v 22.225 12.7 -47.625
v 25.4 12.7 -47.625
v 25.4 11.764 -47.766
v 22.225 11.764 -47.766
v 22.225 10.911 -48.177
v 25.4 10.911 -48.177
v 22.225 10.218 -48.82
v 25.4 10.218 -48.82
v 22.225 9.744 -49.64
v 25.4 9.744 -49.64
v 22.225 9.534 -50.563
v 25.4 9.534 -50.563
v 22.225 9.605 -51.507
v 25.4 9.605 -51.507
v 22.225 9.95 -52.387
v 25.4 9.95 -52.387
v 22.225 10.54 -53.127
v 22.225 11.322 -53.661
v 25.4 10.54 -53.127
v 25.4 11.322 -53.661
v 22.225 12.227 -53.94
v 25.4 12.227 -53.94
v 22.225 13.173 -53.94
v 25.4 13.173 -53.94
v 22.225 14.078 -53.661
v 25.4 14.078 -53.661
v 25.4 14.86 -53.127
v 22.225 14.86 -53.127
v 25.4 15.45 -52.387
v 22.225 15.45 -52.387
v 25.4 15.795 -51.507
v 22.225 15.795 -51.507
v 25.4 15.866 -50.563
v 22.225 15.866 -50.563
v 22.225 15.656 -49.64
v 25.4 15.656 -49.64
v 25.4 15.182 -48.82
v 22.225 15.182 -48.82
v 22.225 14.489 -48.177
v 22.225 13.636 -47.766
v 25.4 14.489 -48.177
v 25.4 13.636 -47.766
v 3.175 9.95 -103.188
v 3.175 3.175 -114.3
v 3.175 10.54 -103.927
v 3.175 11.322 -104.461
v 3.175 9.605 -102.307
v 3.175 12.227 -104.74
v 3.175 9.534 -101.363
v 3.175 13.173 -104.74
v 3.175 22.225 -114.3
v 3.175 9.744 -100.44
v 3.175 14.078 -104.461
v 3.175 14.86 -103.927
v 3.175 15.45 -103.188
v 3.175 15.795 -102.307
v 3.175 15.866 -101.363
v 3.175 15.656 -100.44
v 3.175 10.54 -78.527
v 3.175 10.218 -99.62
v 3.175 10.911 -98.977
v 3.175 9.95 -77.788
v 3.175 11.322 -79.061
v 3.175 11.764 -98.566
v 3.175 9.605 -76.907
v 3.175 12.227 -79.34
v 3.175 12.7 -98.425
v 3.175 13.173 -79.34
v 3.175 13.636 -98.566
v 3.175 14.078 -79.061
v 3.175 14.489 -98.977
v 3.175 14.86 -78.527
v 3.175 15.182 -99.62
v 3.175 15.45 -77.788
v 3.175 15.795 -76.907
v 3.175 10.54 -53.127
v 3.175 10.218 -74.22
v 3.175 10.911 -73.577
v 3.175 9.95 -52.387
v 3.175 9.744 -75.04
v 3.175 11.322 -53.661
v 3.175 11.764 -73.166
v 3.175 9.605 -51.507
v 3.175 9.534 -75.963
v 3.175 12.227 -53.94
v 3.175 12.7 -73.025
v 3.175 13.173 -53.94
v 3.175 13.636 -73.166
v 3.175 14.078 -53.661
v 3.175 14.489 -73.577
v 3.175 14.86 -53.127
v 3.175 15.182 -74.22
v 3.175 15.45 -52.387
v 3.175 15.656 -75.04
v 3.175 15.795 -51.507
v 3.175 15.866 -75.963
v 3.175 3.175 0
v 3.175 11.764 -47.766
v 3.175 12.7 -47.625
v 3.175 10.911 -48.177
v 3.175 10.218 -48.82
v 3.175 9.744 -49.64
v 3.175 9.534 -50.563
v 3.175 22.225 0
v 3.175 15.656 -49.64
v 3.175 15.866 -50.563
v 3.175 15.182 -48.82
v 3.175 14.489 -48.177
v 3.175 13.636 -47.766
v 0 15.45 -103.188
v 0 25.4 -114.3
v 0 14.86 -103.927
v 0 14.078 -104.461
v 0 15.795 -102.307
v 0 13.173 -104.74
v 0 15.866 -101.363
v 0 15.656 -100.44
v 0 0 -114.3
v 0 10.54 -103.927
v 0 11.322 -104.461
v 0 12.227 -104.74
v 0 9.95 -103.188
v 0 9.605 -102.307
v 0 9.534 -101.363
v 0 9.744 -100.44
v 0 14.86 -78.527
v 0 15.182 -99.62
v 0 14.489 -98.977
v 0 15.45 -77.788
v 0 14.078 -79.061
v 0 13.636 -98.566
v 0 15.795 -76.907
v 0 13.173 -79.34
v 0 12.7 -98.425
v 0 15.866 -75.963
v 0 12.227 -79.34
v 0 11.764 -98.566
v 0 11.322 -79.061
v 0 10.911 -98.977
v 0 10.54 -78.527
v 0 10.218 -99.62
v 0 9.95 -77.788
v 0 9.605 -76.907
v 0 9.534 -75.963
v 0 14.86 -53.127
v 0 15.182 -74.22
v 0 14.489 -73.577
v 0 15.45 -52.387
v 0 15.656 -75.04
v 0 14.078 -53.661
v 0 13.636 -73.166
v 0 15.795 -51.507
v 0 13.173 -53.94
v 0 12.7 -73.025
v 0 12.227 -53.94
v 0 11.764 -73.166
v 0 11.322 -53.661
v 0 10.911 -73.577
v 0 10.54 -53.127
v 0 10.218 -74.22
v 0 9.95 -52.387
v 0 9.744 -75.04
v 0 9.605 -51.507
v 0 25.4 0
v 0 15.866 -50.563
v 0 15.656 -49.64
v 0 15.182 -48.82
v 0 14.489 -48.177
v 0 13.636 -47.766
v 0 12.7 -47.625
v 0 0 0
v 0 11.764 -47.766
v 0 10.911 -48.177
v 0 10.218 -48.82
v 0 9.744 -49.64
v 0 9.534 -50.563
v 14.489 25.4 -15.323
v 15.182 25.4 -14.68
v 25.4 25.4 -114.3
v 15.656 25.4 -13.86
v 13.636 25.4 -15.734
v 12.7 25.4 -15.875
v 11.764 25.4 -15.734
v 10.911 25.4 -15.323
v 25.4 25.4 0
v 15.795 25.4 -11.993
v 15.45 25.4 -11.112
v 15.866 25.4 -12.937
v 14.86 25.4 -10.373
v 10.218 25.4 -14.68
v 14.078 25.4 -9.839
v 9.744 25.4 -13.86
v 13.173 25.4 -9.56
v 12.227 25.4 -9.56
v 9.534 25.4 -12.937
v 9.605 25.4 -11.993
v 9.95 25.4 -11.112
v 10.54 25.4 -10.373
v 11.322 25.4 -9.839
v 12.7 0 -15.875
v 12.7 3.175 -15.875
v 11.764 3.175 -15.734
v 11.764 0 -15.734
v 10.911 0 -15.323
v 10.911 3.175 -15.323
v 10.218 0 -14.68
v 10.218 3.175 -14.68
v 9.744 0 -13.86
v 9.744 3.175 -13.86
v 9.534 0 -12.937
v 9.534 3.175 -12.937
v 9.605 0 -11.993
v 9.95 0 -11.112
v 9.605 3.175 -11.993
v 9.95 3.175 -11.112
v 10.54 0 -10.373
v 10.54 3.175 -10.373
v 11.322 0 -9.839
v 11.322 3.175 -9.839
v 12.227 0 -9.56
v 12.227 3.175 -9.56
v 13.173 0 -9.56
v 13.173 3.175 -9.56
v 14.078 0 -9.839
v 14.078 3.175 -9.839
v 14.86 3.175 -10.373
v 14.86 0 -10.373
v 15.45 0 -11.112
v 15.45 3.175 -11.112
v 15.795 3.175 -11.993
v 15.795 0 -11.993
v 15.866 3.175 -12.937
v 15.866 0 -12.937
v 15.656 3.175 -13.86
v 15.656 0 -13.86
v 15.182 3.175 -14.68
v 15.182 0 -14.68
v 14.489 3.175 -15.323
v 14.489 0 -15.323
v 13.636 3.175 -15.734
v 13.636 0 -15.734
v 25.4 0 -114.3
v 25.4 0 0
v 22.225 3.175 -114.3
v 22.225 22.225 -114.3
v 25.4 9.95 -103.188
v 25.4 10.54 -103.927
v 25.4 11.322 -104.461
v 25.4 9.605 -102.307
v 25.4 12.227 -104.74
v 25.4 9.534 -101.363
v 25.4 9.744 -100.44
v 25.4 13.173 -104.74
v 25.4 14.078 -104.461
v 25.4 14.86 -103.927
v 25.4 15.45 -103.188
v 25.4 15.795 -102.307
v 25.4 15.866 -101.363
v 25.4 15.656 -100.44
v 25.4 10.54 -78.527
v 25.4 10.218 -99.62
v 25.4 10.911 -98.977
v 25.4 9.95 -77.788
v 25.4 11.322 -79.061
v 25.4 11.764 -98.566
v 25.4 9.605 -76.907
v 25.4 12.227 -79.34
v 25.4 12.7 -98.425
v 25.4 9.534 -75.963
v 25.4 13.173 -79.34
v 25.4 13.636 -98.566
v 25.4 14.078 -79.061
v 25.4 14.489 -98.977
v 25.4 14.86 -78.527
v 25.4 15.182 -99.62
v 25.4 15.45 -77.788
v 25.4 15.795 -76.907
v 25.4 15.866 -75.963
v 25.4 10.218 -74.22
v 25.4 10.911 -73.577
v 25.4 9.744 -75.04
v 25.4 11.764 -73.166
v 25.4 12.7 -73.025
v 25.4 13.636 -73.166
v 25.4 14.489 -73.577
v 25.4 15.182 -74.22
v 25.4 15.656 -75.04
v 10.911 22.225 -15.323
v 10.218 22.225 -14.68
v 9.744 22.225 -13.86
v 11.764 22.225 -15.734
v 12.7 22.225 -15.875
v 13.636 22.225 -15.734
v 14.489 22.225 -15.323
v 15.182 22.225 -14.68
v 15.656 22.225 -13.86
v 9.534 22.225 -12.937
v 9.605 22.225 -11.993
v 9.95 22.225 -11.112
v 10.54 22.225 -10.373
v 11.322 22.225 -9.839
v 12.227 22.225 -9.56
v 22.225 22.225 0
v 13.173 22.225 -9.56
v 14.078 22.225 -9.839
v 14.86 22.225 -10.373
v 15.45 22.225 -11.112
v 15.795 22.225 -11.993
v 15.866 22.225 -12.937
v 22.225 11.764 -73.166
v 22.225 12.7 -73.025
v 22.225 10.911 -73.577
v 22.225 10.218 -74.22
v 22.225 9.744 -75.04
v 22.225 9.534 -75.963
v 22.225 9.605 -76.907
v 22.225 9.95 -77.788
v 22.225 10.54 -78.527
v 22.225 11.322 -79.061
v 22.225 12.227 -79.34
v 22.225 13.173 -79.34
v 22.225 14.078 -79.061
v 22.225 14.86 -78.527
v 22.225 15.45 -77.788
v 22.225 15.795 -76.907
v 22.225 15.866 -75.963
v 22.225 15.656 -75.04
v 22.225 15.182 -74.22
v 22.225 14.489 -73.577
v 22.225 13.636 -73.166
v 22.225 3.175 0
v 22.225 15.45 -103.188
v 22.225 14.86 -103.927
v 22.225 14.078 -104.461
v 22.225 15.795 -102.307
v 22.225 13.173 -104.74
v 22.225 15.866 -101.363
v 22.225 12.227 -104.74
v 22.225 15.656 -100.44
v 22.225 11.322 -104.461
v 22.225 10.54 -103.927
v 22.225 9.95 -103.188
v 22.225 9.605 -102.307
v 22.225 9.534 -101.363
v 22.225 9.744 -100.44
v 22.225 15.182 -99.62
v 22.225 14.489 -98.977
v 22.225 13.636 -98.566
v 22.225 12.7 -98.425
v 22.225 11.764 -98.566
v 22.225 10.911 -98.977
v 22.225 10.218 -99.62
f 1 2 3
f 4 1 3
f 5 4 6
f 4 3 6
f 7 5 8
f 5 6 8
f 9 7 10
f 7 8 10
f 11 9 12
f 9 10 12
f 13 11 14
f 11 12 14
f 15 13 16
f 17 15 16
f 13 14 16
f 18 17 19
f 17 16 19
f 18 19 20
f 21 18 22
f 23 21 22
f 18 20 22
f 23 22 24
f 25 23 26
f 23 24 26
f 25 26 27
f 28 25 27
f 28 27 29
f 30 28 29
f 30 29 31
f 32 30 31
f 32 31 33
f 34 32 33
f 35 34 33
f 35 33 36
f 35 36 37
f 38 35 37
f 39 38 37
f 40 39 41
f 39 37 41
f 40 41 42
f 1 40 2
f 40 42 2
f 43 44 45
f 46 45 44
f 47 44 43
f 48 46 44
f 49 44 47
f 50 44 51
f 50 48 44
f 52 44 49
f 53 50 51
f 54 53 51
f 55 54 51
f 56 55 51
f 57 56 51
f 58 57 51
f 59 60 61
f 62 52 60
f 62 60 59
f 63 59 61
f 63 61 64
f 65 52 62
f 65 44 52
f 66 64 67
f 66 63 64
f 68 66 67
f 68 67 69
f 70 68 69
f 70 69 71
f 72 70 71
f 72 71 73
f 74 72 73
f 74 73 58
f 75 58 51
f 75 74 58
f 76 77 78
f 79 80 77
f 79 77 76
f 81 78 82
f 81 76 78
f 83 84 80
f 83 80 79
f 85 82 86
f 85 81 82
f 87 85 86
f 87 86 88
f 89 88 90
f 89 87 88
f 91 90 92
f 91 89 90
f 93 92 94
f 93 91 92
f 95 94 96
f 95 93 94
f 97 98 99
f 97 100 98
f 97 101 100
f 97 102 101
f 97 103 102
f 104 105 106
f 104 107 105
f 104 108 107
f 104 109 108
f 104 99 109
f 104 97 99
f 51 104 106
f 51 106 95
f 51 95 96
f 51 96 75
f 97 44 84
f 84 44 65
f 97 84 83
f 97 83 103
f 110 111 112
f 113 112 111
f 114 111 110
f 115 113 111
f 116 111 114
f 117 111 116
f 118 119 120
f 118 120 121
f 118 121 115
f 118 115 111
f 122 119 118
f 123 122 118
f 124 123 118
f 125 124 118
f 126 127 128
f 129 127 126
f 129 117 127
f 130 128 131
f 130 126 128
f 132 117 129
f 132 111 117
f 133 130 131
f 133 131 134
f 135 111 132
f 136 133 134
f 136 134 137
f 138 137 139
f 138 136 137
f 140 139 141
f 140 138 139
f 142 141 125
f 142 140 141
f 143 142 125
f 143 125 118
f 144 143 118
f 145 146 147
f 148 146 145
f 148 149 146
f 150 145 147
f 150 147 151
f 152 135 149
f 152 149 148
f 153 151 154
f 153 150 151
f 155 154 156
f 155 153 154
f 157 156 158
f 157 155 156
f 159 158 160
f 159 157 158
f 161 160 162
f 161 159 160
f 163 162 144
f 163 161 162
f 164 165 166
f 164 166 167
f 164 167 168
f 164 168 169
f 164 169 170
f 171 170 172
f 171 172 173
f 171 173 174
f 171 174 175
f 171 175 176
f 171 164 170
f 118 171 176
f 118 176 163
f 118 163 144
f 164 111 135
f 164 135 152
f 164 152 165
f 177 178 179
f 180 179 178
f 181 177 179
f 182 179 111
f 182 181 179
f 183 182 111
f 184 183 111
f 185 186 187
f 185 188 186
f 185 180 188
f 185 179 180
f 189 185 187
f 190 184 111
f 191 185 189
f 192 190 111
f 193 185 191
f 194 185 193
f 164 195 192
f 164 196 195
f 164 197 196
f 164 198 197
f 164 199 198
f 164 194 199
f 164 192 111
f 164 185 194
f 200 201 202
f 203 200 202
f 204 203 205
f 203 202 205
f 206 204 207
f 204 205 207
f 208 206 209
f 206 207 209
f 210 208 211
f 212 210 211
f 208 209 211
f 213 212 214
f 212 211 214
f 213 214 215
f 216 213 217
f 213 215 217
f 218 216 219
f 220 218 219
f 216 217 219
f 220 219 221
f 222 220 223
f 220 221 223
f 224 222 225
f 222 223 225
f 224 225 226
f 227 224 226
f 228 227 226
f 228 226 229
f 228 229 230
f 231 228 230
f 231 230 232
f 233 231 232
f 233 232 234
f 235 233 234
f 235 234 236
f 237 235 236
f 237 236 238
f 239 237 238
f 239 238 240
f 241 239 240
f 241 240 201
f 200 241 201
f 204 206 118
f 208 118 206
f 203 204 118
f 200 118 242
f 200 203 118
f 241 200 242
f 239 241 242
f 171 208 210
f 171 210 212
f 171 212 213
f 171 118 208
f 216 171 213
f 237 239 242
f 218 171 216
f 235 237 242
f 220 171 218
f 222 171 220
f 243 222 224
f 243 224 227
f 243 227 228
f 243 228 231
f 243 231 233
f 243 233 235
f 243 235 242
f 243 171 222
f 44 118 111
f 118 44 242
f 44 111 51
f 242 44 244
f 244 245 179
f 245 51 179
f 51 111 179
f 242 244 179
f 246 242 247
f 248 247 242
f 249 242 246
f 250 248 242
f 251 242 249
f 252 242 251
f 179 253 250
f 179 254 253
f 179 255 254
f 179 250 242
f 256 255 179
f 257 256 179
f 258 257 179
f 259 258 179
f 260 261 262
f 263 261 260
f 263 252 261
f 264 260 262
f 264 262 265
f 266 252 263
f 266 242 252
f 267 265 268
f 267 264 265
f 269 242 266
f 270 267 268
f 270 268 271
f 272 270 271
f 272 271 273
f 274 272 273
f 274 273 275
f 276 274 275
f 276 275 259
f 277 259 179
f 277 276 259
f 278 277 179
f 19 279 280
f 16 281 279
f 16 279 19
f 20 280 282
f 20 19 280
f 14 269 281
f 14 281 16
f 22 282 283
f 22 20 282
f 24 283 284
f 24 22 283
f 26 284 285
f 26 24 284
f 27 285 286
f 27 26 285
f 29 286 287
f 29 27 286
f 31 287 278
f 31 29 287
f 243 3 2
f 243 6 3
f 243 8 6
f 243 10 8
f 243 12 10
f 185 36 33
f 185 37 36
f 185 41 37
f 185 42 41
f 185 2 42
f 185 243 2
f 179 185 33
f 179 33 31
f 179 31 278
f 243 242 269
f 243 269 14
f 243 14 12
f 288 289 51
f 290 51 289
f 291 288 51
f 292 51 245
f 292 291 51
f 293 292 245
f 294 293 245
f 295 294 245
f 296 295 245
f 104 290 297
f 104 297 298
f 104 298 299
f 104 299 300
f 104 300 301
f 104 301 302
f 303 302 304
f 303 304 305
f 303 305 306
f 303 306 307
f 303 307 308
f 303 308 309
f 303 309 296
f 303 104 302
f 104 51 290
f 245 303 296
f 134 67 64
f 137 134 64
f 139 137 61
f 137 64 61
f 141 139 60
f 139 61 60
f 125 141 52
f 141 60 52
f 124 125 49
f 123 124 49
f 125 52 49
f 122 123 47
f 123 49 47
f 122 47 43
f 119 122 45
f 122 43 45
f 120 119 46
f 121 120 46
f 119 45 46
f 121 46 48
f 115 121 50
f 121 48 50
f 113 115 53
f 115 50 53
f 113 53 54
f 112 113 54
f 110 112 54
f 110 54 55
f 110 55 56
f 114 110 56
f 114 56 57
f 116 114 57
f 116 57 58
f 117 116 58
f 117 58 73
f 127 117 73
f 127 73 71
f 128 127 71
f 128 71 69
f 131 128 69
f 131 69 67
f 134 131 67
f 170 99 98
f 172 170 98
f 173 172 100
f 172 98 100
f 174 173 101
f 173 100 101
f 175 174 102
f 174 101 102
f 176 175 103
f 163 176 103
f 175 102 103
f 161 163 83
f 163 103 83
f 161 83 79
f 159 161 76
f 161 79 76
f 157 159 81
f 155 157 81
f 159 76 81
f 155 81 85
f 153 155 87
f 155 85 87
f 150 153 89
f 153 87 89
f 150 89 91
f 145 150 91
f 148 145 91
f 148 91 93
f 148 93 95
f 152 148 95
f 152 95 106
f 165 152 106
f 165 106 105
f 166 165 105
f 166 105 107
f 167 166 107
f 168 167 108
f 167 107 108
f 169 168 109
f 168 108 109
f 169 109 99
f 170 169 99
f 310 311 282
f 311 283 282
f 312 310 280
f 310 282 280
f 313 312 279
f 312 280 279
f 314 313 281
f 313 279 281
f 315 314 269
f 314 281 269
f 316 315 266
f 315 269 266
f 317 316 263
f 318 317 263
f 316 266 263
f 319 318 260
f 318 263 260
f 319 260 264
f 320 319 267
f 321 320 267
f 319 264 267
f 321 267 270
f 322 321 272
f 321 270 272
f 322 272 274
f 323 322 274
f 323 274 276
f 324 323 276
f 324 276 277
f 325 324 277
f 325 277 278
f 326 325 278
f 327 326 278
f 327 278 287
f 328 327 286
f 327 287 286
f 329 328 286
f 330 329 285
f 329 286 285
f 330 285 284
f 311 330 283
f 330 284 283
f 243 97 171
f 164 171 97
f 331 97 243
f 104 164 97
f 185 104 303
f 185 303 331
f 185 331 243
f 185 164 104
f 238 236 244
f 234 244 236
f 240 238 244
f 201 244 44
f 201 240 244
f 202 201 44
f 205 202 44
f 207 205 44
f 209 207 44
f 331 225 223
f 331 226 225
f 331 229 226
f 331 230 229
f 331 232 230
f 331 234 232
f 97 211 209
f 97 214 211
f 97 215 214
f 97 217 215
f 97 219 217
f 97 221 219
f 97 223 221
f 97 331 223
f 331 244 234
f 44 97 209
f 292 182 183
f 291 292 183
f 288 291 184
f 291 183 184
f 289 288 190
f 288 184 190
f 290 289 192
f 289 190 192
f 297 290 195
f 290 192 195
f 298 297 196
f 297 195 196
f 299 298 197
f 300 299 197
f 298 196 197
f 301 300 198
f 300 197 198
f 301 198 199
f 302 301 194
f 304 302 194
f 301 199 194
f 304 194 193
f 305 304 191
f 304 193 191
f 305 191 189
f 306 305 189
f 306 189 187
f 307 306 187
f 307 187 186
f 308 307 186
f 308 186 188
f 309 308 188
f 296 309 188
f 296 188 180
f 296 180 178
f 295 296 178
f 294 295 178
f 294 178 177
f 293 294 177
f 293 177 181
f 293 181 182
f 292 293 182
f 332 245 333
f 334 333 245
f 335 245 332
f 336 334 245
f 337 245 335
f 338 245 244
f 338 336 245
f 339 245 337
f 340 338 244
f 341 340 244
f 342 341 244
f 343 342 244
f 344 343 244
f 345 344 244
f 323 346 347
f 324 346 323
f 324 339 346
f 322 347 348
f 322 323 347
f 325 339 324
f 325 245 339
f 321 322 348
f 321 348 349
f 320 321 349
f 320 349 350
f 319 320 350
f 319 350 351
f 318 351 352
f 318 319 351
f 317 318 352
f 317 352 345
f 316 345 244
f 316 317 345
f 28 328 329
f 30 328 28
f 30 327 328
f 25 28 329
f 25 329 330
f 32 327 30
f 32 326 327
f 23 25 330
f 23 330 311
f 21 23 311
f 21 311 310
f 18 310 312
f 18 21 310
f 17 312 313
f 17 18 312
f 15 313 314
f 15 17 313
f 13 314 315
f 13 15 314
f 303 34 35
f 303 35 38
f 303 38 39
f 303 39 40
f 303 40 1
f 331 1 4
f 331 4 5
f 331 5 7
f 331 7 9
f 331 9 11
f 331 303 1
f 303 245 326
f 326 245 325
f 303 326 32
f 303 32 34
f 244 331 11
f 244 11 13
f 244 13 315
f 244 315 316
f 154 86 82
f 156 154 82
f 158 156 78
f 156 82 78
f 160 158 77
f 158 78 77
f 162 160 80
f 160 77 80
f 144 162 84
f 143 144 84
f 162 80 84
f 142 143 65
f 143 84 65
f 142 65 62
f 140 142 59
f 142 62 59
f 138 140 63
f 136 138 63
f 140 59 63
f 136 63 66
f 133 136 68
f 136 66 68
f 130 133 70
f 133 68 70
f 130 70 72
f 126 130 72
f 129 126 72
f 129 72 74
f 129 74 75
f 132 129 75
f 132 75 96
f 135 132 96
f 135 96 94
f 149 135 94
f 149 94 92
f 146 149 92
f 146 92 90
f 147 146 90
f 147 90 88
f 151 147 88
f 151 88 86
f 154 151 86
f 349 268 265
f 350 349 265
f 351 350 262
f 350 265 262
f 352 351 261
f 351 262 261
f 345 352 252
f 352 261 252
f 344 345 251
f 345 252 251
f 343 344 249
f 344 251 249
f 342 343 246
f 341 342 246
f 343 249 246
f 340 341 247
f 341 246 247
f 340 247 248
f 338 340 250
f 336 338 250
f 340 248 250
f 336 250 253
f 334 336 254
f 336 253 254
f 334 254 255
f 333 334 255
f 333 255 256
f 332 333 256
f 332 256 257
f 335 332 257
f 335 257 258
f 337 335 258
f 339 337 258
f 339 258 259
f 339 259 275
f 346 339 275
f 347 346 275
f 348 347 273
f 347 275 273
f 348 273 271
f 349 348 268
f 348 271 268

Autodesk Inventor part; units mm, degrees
ref_plane "YZ Plane" through (0, 0, 0) normal (1, 0, 0) x (0, 1, 0)
ref_plane "XZ Plane" through (0, 0, 0) normal (0, 1, 0) x (-1, 0, 0)
ref_plane "XY Plane" through (0, 0, 0) normal (0, 0, 1) x (1, 0, 0)
sketch "Sketch1" plane through (0, 0, 0) normal (0, 0, 1) x (1, 0, 0)
  line L0 (0, 0) -> (25.4, 0)
  line L1 (25.4, 0) -> (25.4, 25.4)
  line L2 (25.4, 25.4) -> (0, 25.4)
  line L3 (0, 25.4) -> (0, 0)
  line L4 (3.175, 22.225) -> (22.225, 22.225)
  line L5 (22.225, 22.225) -> (22.225, 3.175)
  line L6 (22.225, 3.175) -> (3.175, 3.175)
  line L7 (3.175, 3.175) -> (3.175, 22.225)
  dimension "d0" = 25.4
  dimension "d1" = 25.4
  dimension "d2" = 3.175
extrude "Extrusion1" add sketch "Sketch1" against normal blind 114.3
sketch "Sketch2" plane through (0, 0, 0) normal (-1, 0, 0) x (0, 0, 1)
  line L0 (-114.3, 25.4) -> (-114.3, 0) projected
  point P0 (-101.6, 12.7)
  point P1 (-76.2, 12.7)
  point P2 (-50.8, 12.7)
  dimension "d5" = 12.7
  dimension "d6" = 25.4
  dimension "d7" = 25.4
hole "Hole1" at (0, 12.7, -101.6) at (0, 12.7, -76.2) at (0, 12.7, -50.8) direction (1, 0, 0) diameter 6.35 depth 25.4 tip angle 118
sketch "Sketch3" plane through (0, 0, 0) normal (0, -1, 0) x (1, 0, 0)
  line L0 (0, 0) -> (25.4, 0) projected
  point P0 (12.7, -12.7)
  dimension "d15" = 12.7
hole "Hole2" at (12.7, 0, -12.7) direction (0, 1, 0) diameter 6.35 depth 25.4 tip angle 118
properties part number "towerside4.5inbrace"
